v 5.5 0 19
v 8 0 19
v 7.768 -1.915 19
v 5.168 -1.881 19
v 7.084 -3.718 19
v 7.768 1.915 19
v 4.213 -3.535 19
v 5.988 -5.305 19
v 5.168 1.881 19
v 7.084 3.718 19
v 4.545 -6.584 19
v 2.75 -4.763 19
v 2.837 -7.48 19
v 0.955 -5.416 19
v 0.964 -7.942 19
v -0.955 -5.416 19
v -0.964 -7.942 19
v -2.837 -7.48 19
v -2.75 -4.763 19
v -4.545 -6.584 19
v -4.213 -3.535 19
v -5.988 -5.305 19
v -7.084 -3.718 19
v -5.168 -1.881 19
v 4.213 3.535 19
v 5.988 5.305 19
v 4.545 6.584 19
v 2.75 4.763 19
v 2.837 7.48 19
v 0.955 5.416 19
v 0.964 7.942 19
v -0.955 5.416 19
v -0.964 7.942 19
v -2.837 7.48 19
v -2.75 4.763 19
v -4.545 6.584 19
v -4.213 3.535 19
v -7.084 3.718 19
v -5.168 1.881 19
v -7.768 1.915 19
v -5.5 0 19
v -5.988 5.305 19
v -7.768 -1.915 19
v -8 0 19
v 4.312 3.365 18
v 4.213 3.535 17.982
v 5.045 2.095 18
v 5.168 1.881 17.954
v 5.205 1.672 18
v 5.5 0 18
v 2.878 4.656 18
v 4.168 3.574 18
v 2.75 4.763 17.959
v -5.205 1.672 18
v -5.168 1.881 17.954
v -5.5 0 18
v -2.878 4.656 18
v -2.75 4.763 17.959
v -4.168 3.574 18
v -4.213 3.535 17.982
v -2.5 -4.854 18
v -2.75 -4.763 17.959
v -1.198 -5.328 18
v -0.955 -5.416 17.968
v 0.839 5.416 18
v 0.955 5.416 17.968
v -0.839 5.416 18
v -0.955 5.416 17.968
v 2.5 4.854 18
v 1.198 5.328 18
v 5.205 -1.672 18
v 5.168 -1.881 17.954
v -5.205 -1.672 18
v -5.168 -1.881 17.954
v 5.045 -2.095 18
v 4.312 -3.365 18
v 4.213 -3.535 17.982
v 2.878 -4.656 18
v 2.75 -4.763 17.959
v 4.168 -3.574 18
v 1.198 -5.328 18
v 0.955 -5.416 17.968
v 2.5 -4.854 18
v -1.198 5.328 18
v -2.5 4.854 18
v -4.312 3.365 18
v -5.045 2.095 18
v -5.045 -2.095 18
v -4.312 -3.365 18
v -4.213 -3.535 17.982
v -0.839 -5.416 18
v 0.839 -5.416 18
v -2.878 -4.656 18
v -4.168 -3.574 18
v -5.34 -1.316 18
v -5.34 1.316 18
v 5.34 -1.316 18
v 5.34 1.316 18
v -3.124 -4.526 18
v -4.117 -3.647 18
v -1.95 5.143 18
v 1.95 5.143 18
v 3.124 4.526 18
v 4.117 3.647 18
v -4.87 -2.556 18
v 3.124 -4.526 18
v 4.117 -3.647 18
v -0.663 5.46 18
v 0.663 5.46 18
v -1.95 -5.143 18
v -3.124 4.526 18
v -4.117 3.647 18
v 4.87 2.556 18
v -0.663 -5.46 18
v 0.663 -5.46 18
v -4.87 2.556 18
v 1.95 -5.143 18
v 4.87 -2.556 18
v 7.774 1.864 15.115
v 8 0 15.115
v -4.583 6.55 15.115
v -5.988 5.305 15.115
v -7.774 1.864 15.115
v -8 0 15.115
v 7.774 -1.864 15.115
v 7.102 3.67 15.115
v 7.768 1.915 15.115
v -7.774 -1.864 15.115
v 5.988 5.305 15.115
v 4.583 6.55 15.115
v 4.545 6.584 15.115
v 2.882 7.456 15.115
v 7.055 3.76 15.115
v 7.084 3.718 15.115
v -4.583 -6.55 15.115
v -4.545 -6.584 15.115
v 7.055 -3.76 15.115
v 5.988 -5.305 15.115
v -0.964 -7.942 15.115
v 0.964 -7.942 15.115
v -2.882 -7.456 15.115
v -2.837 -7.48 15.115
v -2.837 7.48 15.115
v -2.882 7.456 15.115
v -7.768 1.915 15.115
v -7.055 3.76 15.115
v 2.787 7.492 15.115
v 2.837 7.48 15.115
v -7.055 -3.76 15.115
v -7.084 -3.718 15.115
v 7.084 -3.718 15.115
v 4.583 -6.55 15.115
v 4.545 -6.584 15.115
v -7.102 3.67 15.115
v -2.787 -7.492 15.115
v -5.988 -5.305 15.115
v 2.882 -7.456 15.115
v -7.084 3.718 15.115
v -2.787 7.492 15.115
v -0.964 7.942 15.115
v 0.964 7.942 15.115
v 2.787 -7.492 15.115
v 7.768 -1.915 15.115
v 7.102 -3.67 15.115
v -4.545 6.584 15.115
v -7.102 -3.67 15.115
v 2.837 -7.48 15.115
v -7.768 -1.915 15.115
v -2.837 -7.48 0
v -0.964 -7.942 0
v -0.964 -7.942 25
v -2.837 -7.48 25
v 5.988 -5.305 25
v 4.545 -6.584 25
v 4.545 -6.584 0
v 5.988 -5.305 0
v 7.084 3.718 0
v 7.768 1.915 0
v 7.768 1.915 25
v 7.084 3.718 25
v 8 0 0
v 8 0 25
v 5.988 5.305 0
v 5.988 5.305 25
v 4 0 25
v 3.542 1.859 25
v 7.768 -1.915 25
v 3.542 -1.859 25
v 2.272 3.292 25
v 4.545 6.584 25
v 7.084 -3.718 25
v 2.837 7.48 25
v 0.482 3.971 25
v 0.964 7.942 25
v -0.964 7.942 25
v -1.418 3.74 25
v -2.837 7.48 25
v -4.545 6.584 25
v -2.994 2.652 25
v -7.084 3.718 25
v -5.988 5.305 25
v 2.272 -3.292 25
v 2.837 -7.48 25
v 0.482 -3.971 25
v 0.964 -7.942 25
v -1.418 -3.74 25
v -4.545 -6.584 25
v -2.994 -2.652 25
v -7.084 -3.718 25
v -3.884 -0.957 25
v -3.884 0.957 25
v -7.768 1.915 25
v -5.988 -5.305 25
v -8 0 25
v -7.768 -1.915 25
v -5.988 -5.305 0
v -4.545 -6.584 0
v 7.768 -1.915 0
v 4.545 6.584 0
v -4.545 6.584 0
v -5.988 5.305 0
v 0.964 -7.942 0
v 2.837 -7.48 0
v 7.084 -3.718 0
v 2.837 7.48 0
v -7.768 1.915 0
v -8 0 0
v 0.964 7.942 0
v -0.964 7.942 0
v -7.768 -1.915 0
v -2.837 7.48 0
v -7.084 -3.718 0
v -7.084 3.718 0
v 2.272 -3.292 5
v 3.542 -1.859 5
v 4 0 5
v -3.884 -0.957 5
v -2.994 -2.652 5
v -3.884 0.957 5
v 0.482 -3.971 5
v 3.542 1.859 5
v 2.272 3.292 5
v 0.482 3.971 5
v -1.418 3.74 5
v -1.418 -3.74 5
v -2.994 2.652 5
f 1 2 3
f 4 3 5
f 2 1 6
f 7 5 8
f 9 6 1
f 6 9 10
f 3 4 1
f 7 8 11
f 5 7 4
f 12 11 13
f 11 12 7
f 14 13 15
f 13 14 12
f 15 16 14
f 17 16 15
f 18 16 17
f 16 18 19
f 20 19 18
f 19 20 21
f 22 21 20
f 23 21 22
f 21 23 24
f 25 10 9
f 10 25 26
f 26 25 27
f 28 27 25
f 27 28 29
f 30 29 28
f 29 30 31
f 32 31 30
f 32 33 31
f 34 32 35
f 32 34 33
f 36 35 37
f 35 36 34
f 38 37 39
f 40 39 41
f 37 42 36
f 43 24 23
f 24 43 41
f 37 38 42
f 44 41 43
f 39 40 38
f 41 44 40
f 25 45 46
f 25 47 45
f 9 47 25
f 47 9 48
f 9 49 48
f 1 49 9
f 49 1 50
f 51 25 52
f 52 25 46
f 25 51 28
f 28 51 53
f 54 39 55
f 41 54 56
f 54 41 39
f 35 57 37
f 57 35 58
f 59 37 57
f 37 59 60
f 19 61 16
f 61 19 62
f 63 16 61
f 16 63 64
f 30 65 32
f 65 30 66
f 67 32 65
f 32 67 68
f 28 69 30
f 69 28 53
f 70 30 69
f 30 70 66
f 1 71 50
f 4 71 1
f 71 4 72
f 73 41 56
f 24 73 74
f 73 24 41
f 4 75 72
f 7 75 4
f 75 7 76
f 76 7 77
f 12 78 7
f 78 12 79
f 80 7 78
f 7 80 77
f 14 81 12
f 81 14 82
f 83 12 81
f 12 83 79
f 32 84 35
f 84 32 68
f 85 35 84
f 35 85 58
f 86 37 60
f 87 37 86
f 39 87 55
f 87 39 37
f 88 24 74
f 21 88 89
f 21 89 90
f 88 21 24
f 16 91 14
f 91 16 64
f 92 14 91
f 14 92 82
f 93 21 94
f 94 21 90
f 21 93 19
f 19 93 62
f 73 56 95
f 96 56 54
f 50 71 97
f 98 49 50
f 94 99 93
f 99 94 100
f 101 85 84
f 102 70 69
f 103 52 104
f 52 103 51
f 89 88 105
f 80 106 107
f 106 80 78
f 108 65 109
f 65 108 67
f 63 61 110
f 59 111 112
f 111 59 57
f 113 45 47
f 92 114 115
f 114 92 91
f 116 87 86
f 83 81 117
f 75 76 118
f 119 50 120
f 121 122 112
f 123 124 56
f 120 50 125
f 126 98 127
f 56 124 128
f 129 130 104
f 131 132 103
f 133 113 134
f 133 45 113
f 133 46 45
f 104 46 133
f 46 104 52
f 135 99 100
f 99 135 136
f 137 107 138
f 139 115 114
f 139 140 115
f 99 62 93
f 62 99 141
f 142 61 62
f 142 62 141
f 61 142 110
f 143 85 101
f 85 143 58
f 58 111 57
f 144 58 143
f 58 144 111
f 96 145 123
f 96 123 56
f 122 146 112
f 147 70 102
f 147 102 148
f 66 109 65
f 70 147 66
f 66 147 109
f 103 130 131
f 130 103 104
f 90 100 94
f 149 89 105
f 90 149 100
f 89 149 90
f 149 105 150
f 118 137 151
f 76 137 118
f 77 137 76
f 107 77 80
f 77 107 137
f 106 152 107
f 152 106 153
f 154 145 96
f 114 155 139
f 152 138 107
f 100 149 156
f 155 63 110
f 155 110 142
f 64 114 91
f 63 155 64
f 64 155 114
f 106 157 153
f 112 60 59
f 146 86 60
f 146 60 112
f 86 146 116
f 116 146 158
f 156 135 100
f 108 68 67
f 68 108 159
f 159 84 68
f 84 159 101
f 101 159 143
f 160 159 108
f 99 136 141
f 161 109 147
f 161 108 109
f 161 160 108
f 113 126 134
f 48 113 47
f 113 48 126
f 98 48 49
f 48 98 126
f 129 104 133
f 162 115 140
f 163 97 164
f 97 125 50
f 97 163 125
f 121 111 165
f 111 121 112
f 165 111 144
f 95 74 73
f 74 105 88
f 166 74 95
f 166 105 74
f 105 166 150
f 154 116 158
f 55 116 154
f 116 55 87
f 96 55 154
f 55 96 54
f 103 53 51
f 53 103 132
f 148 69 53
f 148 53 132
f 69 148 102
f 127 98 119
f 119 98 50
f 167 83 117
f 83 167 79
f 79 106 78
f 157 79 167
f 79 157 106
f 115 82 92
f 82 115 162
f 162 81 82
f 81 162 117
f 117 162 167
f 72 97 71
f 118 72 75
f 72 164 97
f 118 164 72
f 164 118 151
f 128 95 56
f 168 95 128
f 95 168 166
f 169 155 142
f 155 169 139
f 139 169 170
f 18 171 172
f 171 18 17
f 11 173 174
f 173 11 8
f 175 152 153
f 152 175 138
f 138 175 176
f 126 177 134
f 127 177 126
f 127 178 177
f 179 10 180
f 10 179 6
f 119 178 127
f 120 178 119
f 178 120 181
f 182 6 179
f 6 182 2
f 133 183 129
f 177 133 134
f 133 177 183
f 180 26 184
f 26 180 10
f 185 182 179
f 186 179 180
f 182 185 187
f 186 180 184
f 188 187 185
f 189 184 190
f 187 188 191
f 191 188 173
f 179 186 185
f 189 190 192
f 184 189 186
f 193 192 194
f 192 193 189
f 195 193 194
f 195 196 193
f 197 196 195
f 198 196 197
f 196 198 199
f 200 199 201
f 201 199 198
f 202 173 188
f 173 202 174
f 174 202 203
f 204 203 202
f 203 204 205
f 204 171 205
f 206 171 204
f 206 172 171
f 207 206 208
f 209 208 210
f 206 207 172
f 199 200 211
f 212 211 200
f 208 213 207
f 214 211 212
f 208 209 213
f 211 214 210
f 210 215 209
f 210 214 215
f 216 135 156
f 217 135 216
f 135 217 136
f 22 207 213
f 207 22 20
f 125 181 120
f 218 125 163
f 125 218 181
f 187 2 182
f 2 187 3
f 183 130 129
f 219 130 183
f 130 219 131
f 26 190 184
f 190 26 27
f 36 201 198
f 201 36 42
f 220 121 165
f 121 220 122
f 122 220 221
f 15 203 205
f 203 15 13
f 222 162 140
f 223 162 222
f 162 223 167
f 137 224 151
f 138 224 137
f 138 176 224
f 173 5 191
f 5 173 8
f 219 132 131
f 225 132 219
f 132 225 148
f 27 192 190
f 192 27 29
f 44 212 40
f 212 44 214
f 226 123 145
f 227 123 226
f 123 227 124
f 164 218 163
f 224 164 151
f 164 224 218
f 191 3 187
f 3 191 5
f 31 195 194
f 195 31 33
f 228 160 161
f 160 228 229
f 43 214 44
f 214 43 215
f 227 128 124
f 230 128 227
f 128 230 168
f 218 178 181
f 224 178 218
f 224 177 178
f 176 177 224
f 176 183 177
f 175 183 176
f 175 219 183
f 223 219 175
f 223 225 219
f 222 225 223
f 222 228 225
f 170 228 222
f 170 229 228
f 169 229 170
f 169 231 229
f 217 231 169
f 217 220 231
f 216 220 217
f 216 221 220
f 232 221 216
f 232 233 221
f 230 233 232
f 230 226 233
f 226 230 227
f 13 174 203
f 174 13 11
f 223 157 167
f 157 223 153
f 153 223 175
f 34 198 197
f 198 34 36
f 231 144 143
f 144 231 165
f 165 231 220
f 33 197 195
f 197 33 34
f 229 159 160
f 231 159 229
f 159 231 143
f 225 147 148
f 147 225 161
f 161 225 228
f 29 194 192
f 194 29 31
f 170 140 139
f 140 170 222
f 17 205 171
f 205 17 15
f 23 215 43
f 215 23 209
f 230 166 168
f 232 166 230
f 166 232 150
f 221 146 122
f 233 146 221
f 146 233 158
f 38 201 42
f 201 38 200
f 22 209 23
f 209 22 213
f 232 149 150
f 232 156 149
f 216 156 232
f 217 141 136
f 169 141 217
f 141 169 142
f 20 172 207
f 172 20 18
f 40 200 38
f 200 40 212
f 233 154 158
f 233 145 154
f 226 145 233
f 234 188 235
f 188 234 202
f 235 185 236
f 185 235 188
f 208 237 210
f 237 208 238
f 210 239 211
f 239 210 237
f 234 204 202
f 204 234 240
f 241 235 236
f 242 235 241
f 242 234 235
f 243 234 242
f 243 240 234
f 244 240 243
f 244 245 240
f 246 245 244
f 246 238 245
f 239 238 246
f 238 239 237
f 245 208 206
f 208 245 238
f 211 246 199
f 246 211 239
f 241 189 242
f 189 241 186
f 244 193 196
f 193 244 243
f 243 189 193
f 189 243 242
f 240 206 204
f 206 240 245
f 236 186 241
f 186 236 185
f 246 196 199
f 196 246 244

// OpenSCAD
module ring(r1, r2, h, center=false) {
     difference() {
          cylinder(h=h, r=r1, center=center);
          translate([0,0,-0.5]) cylinder(h=h+1, r=r2, center=center);
     }
}


module tapered_ring() {
     difference() {
          ring(8.1,5.5,4);
          intersection() {
               ring(8.1, 5.5, 3);
               cylinder(r1=8.1, r2=5.5, h=3);
          }
     }
}

module rounded_cylinder(h, r) {
     union() {
          cylinder(h=h-r, r=r);
          translate([0,0,h-r])
               sphere(r=r);
     }
}

// alaosa
/* difference() { */
/*      cylinder(h=20, r=8); */
/*      translate([0,0,25]) */
/*           rotate([180,0,0]) */
/*           rounded_cylinder(h=20, r=3.1); */

/*      translate([0,0,10]) tapered_ring(); */
/* } */

//kärjen osa
difference() {
     cylinder(h=25, r=8);
     translate([0,0,25])
          rotate([180,0,0])
          cylinder(h=20, r=4);
          //rounded_cylinder(h=20, r=4);

     translate([0,0,15]) tapered_ring();
}



//translate([0,0,5]) cylinder(h=45, r=3.1);
